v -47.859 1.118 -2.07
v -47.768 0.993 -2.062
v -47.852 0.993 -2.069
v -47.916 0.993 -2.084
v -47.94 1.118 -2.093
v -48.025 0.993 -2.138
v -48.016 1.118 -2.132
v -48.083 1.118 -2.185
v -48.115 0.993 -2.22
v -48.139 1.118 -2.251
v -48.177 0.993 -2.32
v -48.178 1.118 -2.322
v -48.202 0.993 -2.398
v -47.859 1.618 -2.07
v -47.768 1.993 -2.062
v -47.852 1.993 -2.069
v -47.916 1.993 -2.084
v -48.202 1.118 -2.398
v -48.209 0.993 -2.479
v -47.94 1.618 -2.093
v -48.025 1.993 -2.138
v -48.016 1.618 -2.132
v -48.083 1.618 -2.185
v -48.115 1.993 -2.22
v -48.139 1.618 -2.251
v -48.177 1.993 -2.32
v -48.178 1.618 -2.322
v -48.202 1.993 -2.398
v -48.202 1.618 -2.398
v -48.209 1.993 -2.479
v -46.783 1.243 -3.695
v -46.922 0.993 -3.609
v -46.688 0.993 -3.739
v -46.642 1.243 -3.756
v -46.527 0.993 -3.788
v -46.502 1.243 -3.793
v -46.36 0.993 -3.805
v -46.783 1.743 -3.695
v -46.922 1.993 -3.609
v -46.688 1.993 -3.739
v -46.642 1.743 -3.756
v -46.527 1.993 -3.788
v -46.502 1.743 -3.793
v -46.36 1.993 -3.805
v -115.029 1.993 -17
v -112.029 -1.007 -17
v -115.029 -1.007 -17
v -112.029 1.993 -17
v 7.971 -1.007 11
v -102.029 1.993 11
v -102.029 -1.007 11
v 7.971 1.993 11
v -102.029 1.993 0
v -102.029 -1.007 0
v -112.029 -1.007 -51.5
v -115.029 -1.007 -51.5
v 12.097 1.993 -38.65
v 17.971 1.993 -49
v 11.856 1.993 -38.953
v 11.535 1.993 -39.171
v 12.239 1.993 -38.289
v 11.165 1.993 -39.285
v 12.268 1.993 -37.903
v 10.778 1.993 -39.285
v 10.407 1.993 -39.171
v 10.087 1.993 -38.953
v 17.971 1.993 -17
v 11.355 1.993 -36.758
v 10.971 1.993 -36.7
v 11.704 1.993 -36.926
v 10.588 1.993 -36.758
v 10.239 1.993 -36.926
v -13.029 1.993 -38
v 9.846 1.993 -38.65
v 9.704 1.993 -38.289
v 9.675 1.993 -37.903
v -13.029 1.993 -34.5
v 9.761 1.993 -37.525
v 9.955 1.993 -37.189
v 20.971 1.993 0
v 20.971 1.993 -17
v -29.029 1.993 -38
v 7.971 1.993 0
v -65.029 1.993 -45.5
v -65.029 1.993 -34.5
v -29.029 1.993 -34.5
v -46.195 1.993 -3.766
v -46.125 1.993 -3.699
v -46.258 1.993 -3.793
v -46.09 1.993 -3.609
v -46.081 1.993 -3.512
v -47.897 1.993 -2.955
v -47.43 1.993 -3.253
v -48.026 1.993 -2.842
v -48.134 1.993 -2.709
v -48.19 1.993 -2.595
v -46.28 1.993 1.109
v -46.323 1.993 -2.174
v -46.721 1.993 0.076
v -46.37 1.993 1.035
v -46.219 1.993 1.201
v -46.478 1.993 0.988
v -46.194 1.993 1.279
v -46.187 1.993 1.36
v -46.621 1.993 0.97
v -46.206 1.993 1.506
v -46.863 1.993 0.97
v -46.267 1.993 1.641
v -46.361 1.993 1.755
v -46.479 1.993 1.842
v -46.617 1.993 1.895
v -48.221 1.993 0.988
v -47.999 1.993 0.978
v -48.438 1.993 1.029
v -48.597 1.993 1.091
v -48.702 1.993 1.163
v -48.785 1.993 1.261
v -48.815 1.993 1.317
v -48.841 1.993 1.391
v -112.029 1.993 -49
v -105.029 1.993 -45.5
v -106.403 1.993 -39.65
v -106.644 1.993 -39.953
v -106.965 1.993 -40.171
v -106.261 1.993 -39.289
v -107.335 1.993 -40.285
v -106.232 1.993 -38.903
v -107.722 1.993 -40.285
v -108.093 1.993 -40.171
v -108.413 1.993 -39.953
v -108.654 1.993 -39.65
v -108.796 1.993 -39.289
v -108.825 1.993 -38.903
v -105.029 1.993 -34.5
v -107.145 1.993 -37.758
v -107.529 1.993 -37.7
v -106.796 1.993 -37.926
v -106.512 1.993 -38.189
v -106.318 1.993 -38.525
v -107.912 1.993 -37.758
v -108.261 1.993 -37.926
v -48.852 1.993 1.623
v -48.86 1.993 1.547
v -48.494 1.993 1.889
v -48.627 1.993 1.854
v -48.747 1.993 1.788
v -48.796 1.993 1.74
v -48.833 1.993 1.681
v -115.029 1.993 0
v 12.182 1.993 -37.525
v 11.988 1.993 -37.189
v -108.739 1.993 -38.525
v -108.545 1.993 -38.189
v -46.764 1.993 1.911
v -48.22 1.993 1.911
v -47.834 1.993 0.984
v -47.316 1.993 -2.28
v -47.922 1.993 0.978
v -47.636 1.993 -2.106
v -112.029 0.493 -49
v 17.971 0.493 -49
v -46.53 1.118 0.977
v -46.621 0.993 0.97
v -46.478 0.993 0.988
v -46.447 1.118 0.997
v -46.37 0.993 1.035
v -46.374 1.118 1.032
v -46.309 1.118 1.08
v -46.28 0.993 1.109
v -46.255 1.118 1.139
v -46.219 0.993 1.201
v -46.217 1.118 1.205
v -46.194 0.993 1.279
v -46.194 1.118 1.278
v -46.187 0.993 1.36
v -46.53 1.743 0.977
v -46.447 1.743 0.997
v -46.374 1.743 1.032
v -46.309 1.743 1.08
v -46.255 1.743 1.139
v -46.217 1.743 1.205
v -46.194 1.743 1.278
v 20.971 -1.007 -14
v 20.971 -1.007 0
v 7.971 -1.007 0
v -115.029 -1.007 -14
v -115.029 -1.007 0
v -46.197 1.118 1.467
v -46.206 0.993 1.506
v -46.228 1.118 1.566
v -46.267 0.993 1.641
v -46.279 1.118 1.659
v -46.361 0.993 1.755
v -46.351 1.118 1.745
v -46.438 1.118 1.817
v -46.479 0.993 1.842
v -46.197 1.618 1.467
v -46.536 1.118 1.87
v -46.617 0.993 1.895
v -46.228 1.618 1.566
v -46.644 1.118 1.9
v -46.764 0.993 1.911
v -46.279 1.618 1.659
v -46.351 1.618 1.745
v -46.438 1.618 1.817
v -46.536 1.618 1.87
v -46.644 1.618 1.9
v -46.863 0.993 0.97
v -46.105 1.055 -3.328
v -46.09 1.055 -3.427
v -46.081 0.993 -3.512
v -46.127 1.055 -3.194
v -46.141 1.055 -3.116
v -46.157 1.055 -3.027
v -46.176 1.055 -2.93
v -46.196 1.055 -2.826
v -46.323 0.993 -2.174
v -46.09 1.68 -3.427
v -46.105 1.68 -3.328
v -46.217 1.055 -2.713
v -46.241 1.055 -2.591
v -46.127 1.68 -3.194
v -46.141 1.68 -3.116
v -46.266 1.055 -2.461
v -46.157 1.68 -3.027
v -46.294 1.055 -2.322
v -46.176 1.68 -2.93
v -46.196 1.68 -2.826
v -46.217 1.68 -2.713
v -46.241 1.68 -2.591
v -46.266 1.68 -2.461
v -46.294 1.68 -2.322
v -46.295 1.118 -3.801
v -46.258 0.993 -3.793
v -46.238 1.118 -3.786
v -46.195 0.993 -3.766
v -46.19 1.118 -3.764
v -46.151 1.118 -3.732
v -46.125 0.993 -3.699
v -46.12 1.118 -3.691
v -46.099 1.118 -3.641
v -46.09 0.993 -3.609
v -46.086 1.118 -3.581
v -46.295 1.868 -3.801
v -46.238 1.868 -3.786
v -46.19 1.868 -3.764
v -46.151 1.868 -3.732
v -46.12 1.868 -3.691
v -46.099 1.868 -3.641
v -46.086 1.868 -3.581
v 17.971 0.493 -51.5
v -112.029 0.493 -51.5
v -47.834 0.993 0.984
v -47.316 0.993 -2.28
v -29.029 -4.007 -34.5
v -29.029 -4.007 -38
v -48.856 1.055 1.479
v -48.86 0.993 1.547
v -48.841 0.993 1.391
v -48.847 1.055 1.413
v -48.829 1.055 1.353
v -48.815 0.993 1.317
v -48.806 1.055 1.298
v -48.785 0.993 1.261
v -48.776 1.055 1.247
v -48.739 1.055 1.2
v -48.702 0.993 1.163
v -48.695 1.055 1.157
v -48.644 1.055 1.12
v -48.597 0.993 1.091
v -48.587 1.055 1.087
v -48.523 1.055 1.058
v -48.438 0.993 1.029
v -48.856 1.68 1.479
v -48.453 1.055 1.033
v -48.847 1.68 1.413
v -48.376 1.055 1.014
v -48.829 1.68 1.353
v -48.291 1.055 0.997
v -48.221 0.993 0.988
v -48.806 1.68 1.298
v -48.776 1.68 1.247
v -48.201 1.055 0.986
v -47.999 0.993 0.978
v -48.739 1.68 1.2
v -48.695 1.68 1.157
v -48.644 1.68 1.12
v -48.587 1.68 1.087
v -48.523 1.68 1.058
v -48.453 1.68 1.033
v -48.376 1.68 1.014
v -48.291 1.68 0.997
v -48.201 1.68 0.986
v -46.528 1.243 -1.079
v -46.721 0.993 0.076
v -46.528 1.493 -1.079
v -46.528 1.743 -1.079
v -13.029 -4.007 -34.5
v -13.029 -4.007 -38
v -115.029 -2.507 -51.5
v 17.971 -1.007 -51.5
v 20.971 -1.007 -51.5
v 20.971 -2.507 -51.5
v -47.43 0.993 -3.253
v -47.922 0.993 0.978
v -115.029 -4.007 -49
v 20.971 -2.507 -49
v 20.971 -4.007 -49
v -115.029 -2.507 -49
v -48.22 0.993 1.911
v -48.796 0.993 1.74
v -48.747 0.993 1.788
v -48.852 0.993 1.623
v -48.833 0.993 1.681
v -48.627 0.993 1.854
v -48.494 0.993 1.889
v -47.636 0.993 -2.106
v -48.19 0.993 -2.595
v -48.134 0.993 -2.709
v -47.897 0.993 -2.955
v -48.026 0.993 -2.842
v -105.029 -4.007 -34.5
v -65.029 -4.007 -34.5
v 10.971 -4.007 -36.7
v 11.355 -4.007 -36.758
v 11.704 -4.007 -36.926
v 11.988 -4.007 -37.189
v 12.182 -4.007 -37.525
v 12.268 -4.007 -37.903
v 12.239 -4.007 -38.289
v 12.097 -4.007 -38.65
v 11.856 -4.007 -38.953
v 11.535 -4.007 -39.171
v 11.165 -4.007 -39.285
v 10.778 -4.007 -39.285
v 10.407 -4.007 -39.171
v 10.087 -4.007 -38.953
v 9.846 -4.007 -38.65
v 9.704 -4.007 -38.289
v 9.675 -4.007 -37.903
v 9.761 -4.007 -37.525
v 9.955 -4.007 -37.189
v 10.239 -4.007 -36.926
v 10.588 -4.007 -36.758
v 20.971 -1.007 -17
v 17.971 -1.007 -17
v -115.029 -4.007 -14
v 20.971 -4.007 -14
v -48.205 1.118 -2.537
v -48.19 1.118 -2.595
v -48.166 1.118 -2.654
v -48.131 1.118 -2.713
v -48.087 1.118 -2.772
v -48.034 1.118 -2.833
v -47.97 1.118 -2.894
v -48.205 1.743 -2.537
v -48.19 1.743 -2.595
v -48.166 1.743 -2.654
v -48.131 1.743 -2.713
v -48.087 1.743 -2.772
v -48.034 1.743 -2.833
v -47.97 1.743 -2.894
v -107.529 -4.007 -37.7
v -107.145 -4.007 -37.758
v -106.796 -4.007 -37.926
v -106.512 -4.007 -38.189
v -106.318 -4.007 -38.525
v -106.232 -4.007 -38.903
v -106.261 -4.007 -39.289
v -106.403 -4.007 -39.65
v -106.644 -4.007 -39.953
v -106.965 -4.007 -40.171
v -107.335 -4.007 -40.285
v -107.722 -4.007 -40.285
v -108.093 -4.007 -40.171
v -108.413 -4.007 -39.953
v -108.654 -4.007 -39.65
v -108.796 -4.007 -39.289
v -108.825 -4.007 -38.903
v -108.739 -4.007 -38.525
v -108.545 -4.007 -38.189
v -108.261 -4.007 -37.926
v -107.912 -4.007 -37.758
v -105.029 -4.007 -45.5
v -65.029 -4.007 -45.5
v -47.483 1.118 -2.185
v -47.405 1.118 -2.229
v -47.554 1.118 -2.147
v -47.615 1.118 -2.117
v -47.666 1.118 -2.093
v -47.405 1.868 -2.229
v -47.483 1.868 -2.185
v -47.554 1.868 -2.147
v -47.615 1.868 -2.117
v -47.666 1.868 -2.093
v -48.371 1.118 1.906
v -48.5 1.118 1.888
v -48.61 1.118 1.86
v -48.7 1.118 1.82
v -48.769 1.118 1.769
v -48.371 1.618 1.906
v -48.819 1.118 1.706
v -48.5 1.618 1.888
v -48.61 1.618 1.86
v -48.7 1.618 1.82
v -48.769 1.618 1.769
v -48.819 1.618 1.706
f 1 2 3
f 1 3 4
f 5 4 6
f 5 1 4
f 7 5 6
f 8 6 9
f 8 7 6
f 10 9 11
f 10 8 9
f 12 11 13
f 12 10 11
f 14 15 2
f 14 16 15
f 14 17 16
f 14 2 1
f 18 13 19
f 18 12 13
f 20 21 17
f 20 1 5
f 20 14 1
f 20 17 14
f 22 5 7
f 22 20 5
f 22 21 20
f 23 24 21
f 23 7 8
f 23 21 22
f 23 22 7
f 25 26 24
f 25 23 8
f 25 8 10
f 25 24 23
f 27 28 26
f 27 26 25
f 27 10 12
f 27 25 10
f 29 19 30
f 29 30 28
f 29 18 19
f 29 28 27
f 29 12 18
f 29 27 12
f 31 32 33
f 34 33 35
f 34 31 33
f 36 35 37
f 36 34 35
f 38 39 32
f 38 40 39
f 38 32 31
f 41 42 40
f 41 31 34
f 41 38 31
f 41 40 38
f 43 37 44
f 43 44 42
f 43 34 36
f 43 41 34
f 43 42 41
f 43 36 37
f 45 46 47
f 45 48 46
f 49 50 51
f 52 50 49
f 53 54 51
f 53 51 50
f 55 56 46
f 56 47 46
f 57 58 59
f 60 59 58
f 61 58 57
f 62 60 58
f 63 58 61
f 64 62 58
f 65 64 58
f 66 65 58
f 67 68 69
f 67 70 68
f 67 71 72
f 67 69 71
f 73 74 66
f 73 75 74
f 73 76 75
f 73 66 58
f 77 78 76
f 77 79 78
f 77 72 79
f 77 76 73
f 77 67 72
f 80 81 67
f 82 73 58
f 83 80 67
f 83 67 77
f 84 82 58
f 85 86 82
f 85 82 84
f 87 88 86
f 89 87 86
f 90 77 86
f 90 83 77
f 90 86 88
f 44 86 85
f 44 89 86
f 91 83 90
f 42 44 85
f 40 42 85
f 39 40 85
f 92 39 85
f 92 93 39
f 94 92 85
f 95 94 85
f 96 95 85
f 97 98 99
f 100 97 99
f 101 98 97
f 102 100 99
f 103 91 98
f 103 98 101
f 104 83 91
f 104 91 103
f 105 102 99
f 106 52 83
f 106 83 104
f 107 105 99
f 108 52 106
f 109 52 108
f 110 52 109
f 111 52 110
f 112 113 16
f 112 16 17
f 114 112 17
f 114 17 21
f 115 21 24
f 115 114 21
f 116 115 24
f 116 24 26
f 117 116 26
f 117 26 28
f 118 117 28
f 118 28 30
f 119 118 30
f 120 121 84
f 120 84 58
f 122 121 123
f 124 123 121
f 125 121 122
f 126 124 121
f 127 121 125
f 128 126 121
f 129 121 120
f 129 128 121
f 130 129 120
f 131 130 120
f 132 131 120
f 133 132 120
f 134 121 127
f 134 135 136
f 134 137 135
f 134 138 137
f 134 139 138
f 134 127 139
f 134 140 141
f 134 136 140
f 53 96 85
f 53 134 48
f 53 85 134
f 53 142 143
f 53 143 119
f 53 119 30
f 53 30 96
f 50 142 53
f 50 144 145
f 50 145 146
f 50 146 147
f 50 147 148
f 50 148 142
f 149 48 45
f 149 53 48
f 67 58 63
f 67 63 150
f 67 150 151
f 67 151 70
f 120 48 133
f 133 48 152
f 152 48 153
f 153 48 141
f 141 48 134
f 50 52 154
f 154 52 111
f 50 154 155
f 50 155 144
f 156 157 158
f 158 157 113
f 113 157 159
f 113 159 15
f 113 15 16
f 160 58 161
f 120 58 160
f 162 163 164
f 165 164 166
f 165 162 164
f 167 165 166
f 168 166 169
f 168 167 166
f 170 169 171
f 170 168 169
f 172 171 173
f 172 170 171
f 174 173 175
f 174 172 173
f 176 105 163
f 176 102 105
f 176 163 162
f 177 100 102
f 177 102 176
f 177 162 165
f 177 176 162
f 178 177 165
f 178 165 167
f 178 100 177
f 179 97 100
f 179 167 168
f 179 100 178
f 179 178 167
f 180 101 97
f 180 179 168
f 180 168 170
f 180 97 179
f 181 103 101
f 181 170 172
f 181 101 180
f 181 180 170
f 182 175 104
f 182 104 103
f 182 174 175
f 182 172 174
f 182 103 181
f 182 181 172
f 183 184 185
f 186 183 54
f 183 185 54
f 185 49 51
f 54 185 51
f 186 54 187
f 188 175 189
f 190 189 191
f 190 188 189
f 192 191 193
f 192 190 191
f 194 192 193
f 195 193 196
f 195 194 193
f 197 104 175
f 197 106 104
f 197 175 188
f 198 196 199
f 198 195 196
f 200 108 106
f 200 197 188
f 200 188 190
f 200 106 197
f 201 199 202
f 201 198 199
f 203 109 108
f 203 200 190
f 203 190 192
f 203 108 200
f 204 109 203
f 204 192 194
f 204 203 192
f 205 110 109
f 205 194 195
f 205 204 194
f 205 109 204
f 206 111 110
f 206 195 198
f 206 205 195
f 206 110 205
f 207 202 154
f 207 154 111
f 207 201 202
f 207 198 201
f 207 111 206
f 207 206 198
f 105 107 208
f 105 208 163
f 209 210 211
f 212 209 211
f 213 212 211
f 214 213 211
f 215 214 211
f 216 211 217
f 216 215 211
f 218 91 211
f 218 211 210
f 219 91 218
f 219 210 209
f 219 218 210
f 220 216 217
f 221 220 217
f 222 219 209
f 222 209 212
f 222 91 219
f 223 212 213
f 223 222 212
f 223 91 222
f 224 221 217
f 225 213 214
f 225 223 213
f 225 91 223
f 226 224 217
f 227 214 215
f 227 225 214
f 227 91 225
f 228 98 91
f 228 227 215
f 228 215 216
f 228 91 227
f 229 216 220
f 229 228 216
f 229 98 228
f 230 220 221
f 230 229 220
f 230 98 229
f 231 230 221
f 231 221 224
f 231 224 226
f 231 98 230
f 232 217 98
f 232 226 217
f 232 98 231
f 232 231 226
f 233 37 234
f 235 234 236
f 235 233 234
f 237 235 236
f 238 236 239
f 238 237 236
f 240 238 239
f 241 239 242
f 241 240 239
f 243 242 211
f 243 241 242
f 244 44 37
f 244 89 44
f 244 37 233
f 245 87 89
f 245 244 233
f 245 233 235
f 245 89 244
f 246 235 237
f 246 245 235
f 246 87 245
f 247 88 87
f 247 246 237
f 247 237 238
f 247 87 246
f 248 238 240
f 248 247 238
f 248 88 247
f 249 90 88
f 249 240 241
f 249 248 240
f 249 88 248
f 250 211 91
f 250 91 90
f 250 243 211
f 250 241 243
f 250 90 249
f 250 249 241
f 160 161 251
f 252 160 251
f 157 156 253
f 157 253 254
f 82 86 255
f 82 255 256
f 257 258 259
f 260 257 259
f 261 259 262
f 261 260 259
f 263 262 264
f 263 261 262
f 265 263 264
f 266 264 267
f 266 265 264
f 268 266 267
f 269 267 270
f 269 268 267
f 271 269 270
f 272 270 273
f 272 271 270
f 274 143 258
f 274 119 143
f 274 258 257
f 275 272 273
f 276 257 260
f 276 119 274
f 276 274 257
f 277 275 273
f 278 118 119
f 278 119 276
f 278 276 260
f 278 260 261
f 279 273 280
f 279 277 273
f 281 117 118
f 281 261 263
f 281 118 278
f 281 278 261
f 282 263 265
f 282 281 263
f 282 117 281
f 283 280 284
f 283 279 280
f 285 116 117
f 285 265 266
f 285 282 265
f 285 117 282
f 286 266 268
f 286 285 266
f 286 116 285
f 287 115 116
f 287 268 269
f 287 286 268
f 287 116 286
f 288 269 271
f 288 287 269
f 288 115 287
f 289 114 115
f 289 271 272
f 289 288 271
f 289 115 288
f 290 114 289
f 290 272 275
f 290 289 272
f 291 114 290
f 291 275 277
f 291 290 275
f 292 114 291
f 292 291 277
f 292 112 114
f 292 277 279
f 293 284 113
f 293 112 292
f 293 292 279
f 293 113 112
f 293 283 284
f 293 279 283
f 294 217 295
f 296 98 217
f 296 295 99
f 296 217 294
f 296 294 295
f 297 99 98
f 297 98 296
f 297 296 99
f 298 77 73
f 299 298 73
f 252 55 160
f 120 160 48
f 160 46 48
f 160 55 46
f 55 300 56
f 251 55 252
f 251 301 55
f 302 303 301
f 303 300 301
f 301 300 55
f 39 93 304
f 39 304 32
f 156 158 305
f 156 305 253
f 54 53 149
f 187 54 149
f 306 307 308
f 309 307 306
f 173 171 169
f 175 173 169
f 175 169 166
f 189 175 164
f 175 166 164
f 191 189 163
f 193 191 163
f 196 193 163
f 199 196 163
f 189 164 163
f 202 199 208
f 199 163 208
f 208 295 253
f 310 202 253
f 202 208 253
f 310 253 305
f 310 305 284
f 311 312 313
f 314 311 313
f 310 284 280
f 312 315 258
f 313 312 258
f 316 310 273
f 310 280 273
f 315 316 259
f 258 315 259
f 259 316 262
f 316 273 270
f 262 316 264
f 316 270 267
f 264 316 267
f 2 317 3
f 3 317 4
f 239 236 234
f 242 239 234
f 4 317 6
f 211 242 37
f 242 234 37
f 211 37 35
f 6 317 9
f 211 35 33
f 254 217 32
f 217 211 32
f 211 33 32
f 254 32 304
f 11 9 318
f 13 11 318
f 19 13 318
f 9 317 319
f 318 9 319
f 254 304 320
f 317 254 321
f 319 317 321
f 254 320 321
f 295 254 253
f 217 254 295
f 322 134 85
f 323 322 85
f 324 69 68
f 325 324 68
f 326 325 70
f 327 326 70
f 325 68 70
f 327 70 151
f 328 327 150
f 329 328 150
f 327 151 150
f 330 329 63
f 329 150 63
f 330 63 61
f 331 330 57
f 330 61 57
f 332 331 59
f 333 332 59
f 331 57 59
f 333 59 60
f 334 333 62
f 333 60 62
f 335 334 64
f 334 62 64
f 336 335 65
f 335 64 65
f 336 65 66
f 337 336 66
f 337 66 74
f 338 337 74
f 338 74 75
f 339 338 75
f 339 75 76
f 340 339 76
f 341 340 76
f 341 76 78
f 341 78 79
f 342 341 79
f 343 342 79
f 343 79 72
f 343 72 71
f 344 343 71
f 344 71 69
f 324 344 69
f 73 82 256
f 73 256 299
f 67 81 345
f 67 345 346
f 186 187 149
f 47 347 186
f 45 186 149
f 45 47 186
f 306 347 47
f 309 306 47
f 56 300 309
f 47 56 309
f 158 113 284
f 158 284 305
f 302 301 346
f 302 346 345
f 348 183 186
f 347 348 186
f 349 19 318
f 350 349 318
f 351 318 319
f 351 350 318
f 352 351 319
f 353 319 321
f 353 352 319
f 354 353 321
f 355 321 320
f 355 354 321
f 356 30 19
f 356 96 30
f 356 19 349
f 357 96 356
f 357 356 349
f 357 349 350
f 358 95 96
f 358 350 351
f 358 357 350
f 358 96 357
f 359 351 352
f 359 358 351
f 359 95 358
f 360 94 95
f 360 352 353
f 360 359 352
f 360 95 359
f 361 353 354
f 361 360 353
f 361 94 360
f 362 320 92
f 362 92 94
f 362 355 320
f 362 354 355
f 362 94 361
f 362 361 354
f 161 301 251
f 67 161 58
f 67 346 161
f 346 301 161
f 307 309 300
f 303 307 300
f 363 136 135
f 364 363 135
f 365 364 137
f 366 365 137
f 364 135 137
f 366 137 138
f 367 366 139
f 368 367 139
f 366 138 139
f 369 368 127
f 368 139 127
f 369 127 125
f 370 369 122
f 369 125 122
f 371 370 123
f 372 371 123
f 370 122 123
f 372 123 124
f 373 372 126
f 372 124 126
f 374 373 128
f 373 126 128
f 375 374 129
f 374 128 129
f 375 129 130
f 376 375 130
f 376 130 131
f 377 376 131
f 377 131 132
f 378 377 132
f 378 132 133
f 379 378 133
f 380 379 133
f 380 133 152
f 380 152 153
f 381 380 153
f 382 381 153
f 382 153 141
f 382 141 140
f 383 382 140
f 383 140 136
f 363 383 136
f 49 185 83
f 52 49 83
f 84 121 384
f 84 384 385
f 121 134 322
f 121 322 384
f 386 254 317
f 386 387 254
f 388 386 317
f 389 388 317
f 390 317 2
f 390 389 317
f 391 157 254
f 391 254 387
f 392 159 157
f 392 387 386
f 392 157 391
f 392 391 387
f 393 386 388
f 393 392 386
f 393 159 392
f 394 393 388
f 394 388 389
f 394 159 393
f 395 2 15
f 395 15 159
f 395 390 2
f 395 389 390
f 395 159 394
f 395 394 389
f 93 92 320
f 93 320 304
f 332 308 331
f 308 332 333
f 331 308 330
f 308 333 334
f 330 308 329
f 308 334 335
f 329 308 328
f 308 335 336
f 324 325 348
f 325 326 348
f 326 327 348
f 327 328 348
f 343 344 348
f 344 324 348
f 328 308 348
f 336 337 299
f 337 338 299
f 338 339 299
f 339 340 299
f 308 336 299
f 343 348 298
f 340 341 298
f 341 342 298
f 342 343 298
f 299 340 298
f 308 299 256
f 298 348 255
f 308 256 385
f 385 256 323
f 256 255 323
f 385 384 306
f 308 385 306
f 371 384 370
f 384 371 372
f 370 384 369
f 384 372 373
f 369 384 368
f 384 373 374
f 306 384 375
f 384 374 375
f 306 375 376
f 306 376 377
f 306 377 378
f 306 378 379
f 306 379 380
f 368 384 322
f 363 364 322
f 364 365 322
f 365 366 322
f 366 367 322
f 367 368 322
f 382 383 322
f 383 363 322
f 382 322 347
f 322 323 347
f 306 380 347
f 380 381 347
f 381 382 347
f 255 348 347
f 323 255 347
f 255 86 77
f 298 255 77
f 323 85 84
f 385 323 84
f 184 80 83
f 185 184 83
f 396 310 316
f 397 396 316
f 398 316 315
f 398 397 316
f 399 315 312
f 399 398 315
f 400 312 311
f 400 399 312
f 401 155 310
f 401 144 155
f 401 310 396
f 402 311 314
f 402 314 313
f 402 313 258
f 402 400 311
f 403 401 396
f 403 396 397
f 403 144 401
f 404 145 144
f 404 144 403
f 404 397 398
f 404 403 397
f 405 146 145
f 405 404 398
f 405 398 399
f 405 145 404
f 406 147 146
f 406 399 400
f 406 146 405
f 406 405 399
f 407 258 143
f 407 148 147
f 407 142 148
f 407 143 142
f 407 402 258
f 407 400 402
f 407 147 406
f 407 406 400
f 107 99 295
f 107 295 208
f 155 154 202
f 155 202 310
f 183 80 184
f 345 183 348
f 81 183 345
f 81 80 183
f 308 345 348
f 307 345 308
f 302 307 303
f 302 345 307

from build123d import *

# Parameters (mm, degrees)
SKETCH_1_W          = 110
SKETCH_1_H          = 3
EXTRUDE_1_DEPTH     = 11
SKETCH_2_W          = 136
SKETCH_2_H          = 3
EXTRUDE_2_DEPTH     = 14
SKETCH_3_W          = 136
SKETCH_3_H          = 6
EXTRUDE_3_DEPTH     = 3
SKETCH_4_W          = 130
SKETCH_4_H          = 3
EXTRUDE_4_DEPTH     = 32
CUT_EXTRUDE_1_DEPTH = 1
EXTRUDE_5_REACH     = 146.613
SKETCH_7_W          = 2.5
SKETCH_7_H          = 3
SKETCH_8_W          = 3
SKETCH_8_H          = 1.5
CUT_EXTRUDE_2_DEPTH = 2.5
SKETCH_9_W          = 3
SKETCH_9_H          = 1.5
CUT_EXTRUDE_3_DEPTH = 2.5
CUT_EXTRUDE_4_REACH = 128.174
SKETCH_10_R         = 1.3
SKETCH_11_W         = 40
SKETCH_11_H         = 11
SKETCH_11_W_2       = 16
SKETCH_11_H_2       = 3.5
CUT_EXTRUDE_5_DEPTH = 127.173778052


with BuildPart() as part:
    # 草圖1 → 填料-伸長1 (new body)
    with BuildSketch(Plane.XY):
        with Locations((-47.028571429, 0.492857143)):
            Rectangle(SKETCH_1_W, SKETCH_1_H)
    extrude(amount=EXTRUDE_1_DEPTH)

    # 草圖2 → 填料-伸長2 (add)
    with BuildSketch(Plane(origin=(0, 0, 0), x_dir=(-1, 0, 0), z_dir=(0, 0, -1))):
        with Locations((47.028571429, 0.492857143)):
            Rectangle(SKETCH_2_W, SKETCH_2_H)
    extrude(amount=EXTRUDE_2_DEPTH)

    # 草圖3 → 填料-伸長3 (add)
    with BuildSketch(Plane(origin=(0, 0, -14), x_dir=(-1, 0, 0), z_dir=(0, 0, -1))):
        with Locations((47.028571429, -1.007142857)):
            Rectangle(SKETCH_3_W, SKETCH_3_H)
    extrude(amount=EXTRUDE_3_DEPTH)

    # 草圖4 → 填料-伸長4 (add)
    with BuildSketch(Plane(origin=(0, 0, -17), x_dir=(-1, 0, 0), z_dir=(0, 0, -1))):
        Polygon((-20.971428571, -4.007142857), (115.028571429, -4.007142857), (115.028571429, -1.007142857), (112.028571429, -1.007142857), (-17.971428571, -1.007142857), (-20.971428571, -1.007142857), align=None)
        with Locations((47.028571429, 0.492857143)):
            Rectangle(SKETCH_4_W, SKETCH_4_H)
    extrude(amount=EXTRUDE_4_DEPTH)

    # 草圖5 → 除料-伸長1 (cut)
    with BuildSketch(Plane(origin=(0, 1.992857143, 0), x_dir=(1, 0, 0), z_dir=(0, 1, 0))):
        with BuildLine():
            add(Edge.make_bspline(
                [(-48.220366343, -1.911036809), (-48.270541407, -1.91028686), (-48.364344083, -1.908884824), (-48.494973246, -1.891233228), (-48.606432782, -1.864670281), (-48.697312182, -1.823968869), (-48.770960962, -1.773790726), (-48.822371595, -1.70830112), (-48.855058169, -1.631392184), (-48.858131064, -1.575902375), (-48.859717816, -1.547249089)],
                knots=[0, 0, 0, 0, 1.45873791, 2.727121924, 3.828833403, 4.779149489, 5.611735354, 6.393729658, 7.170569787, 8, 8, 8, 8], degree=3))
            add(Edge.make_bspline(
                [(-48.859717816, -1.547249089), (-48.859067643, -1.524353202), (-48.857792041, -1.479432717), (-48.848509693, -1.414107352), (-48.830269076, -1.353834434), (-48.807934617, -1.297240882), (-48.776845824, -1.245857786), (-48.73947396, -1.198744224), (-48.695811026, -1.155390258), (-48.643573446, -1.119347879), (-48.58700269, -1.084220527), (-48.522090534, -1.057366485), (-48.452126202, -1.031020798), (-48.374003189, -1.012615071), (-48.28987434, -0.995717942), (-48.198785859, -0.985465569), (-48.101387827, -0.978697318), (-48.034129185, -0.977978226), (-47.99926183, -0.977605443)],
                knots=[0, 0, 0, 0, 0.939525648, 1.843298225, 2.696554254, 3.5181456, 4.333093057, 5.149672587, 5.981863818, 6.845973329, 7.747779578, 8.708210785, 9.721263674, 10.812355027, 11.995550541, 13.240878593, 14.569652006, 16, 16, 16, 16], degree=3))
            Line((-47.99926183, -0.977605443), (-47.92192971, -0.977605443))
            add(Edge.make_bspline(
                [(-47.92192971, -0.977605443), (-47.907747598, -0.977653916), (-47.87818965, -0.977754942), (-47.848927636, -0.981955468), (-47.833705742, -0.984140552)],
                knots=[0, 0, 0, 0, 0.959614092, 2, 2, 2, 2], degree=3))
            Line((-47.833705742, -0.984140552), (-47.316342966, 2.280146269))
            add(Edge.make_bspline(
                [(-47.316342966, 2.280146269), (-47.345668471, 2.262935651), (-47.40078619, 2.230588039), (-47.480262355, 2.186880195), (-47.549909775, 2.148608363), (-47.611299516, 2.1185844), (-47.662490647, 2.093025466), (-47.706107648, 2.078035164), (-47.73968456, 2.064921848), (-47.759932978, 2.063076729), (-47.768354654, 2.062309311)],
                knots=[0, 0, 0, 0, 1.618709582, 3.042388521, 4.318437639, 5.400649213, 6.297638627, 7.036053737, 7.59907764, 8, 8, 8, 8], degree=3))
            add(Edge.make_bspline(
                [(-47.768354654, 2.062309311), (-47.798642133, 2.063656774), (-47.857249869, 2.06626418), (-47.941602172, 2.090018879), (-48.017357284, 2.13011156), (-48.08502679, 2.183226474), (-48.140088137, 2.247846893), (-48.180034599, 2.320139031), (-48.205597516, 2.397901123), (-48.208170919, 2.452041748), (-48.209474495, 2.479467086)],
                knots=[0, 0, 0, 0, 1.075146434, 2.080460303, 3.085028113, 4.105066915, 5.121505953, 6.080595913, 7.027711528, 8, 8, 8, 8], degree=3))
            add(Edge.make_bspline(
                [(-48.209474495, 2.479467086), (-48.208816812, 2.498828628), (-48.207480817, 2.538159014), (-48.190274999, 2.596456162), (-48.166994024, 2.656064112), (-48.13067359, 2.714646481), (-48.086993317, 2.775009305), (-48.033359047, 2.836236327), (-47.968905095, 2.896683711), (-47.921447851, 2.935397881), (-47.89687846, 2.95544084)],
                knots=[0, 0, 0, 0, 0.787225613, 1.599143722, 2.462777159, 3.392467032, 4.399736937, 5.501852795, 6.706668326, 8, 8, 8, 8], degree=3))
            Line((-47.89687846, 2.95544084), (-47.429618184, 3.252788288))
            Line((-47.429618184, 3.252788288), (-46.922058071, 3.608951715))
            add(Edge.make_bspline(
                [(-46.922058071, 3.608951715), (-46.876413832, 3.639138489), (-46.788094754, 3.697548226), (-46.645736231, 3.75807991), (-46.503481767, 3.798286546), (-46.407496481, 3.802782202), (-46.360038718, 3.805004978)],
                knots=[0, 0, 0, 0, 1.084242535, 2.09794932, 3.059573881, 4, 4, 4, 4], degree=3))
            add(Edge.make_bspline(
                [(-46.360038718, 3.805004978), (-46.3381608, 3.804388851), (-46.296781759, 3.803223532), (-46.239109283, 3.788739172), (-46.189869766, 3.765868881), (-46.148963408, 3.733393204), (-46.11814663, 3.690639657), (-46.096158463, 3.638981159), (-46.083357921, 3.578342667), (-46.08195108, 3.53495132), (-46.081207412, 3.512014269)],
                knots=[0, 0, 0, 0, 1.130594233, 2.138361778, 3.055019383, 3.924169546, 4.811632327, 5.75471089, 6.813120257, 8, 8, 8, 8], degree=3))
            add(Edge.make_bspline(
                [(-46.081207412, 3.512014269), (-46.08156363, 3.505479814), (-46.08243511, 3.489493395), (-46.084204273, 3.461029672), (-46.090707373, 3.424207889), (-46.09642404, 3.378657845), (-46.106005481, 3.324747731), (-46.115079801, 3.262129111), (-46.127301873, 3.191363134), (-46.14168701, 3.112256155), (-46.157847106, 3.024360372), (-46.176607518, 2.927900752), (-46.195977289, 2.822862657), (-46.217822392, 2.709597476), (-46.241950094, 2.588075039), (-46.266930873, 2.457651605), (-46.293968395, 2.318923362), (-46.313154025, 2.223498794), (-46.323006436, 2.174495345)],
                knots=[0, 0, 0, 0, 0.23106447, 0.565294867, 1.005764972, 1.549550621, 2.185906339, 2.938197749, 3.783158138, 4.720914698, 5.776755442, 6.938105291, 8.189993867, 9.547402134, 11.010355101, 12.563823371, 14.235417664, 16, 16, 16, 16], degree=3))
            add(Edge.make_bspline(
                [(-46.323006436, 2.174495345), (-46.357825146, 1.994478693), (-46.428386042, 1.629670918), (-46.529401683, 1.074537611), (-46.627786589, 0.504560358), (-46.68938042, 0.119270973), (-46.720558885, -0.075760435)],
                knots=[0, 0, 0, 0, 0.962799145, 1.951134026, 2.962875099, 4, 4, 4, 4], degree=3))
            Line((-46.720558885, -0.075760435), (-46.863242092, -0.969981149))
            Line((-46.863242092, -0.969981149), (-46.621443068, -0.969981149))
            add(Edge.make_bspline(
                [(-46.621443068, -0.969981149), (-46.590828719, -0.971065908), (-46.531735764, -0.97315975), (-46.447558792, -0.994017247), (-46.37289879, -1.030001679), (-46.307480713, -1.077598676), (-46.253676365, -1.136347365), (-46.214944889, -1.204076877), (-46.190689754, -1.279514507), (-46.188165035, -1.332490786), (-46.186858337, -1.359909305)],
                knots=[0, 0, 0, 0, 1.122867763, 2.167401115, 3.157408072, 4.149478012, 5.12172718, 6.059443137, 6.995641138, 8, 8, 8, 8], degree=3))
            add(Edge.make_bspline(
                [(-46.186858337, -1.359909305), (-46.188429675, -1.395769989), (-46.191525997, -1.466433442), (-46.225931374, -1.567887827), (-46.277285831, -1.663022499), (-46.349235784, -1.748021435), (-46.435799472, -1.820134294), (-46.535216898, -1.873541109), (-46.646458865, -1.904887272), (-46.72398679, -1.908939039), (-46.764126276, -1.911036809)],
                knots=[0, 0, 0, 0, 0.967297154, 1.906058354, 2.869352191, 3.881168242, 4.9005468, 5.90310656, 6.91434956, 8, 8, 8, 8], degree=3))
            Line((-46.764126276, -1.911036809), (-48.220366343, -1.911036809))
        make_face()
    extrude(amount=-CUT_EXTRUDE_1_DEPTH, mode=Mode.SUBTRACT)

    # 填料-伸長5: up to this face of the body (flat: up to its plane)
    extrude_5_end = Plane(part.part.faces().sort_by_distance((-115.028571429, -1.526373626, -23.980769231))[0])
    # 草圖7 → 填料-伸長5 (add, up to the picked face)
    with BuildSketch(Plane(origin=(20.971428571, 0, 0), x_dir=(0, 0, -1), z_dir=(1, 0, 0)), mode=Mode.PRIVATE) as extrude_5_sk1:
        with Locations((50.25, -1.007142857)):
            Rectangle(SKETCH_7_W, SKETCH_7_H)
    extrude_5_tool1 = split(extrude(extrude_5_sk1.sketch, amount=-EXTRUDE_5_REACH, mode=Mode.PRIVATE), bisect_by=extrude_5_end, keep=Keep.BOTH, mode=Mode.PRIVATE)
    add(extrude_5_tool1.solids().sort_by(Axis((20.971429, -1.007143, -50.25), (-1, 0, 0)))[0])

    # 草圖8 → 除料-伸長2 (cut)
    with BuildSketch(Plane.XY.offset(-49)):
        with Locations((-113.528571429, -0.257142857)):
            Rectangle(SKETCH_8_W, SKETCH_8_H)
    extrude(amount=-CUT_EXTRUDE_2_DEPTH, mode=Mode.SUBTRACT)

    # 草圖9 → 除料-伸長3 (cut)
    with BuildSketch(Plane.XY.offset(-49)):
        with Locations((19.471428571, -0.257142857)):
            Rectangle(SKETCH_9_W, SKETCH_9_H)
    extrude(amount=-CUT_EXTRUDE_3_DEPTH, mode=Mode.SUBTRACT)

    # 草圖10 → 除料-伸長4 (cut, up to next)
    with BuildSketch(Plane(origin=(0, 1.992857143, 0), x_dir=(1, 0, 0), z_dir=(0, 1, 0)), mode=Mode.PRIVATE) as cut_extrude_4_sk1:
        with Locations(Location((-107.528571429, 39, 0), (0, 0, 270))):
            Circle(SKETCH_10_R)
    cut_extrude_4_tool1 = extrude(cut_extrude_4_sk1.sketch, amount=-CUT_EXTRUDE_4_REACH, mode=Mode.PRIVATE) & part.part
    # 草圖10 → 除料-伸長4 (cut, up to next)
    with BuildSketch(Plane(origin=(0, 1.992857143, 0), x_dir=(1, 0, 0), z_dir=(0, 1, 0)), mode=Mode.PRIVATE) as cut_extrude_4_sk2:
        with Locations(Location((10.971428571, 38, 0), (0, 0, 270))):
            Circle(SKETCH_10_R)
    cut_extrude_4_tool2 = extrude(cut_extrude_4_sk2.sketch, amount=-CUT_EXTRUDE_4_REACH, mode=Mode.PRIVATE) & part.part
    add(cut_extrude_4_tool1.solids().sort_by_distance((-107.528571, 1.992857, -39))[0], mode=Mode.SUBTRACT)
    add(cut_extrude_4_tool2.solids().sort_by_distance((10.971429, 1.992857, -38))[0], mode=Mode.SUBTRACT)

    # 草圖11 → 除料-伸長5 (cut, through all)
    with BuildSketch(Plane(origin=(0, 1.992857143, 0), x_dir=(1, 0, 0), z_dir=(0, 1, 0))):
        with Locations((-85.028571429, 40)):
            Rectangle(SKETCH_11_W, SKETCH_11_H)
        with Locations((-21.028571429, 36.25)):
            Rectangle(SKETCH_11_W_2, SKETCH_11_H_2)
    extrude(amount=-CUT_EXTRUDE_5_DEPTH, mode=Mode.SUBTRACT)


solid = part.part
